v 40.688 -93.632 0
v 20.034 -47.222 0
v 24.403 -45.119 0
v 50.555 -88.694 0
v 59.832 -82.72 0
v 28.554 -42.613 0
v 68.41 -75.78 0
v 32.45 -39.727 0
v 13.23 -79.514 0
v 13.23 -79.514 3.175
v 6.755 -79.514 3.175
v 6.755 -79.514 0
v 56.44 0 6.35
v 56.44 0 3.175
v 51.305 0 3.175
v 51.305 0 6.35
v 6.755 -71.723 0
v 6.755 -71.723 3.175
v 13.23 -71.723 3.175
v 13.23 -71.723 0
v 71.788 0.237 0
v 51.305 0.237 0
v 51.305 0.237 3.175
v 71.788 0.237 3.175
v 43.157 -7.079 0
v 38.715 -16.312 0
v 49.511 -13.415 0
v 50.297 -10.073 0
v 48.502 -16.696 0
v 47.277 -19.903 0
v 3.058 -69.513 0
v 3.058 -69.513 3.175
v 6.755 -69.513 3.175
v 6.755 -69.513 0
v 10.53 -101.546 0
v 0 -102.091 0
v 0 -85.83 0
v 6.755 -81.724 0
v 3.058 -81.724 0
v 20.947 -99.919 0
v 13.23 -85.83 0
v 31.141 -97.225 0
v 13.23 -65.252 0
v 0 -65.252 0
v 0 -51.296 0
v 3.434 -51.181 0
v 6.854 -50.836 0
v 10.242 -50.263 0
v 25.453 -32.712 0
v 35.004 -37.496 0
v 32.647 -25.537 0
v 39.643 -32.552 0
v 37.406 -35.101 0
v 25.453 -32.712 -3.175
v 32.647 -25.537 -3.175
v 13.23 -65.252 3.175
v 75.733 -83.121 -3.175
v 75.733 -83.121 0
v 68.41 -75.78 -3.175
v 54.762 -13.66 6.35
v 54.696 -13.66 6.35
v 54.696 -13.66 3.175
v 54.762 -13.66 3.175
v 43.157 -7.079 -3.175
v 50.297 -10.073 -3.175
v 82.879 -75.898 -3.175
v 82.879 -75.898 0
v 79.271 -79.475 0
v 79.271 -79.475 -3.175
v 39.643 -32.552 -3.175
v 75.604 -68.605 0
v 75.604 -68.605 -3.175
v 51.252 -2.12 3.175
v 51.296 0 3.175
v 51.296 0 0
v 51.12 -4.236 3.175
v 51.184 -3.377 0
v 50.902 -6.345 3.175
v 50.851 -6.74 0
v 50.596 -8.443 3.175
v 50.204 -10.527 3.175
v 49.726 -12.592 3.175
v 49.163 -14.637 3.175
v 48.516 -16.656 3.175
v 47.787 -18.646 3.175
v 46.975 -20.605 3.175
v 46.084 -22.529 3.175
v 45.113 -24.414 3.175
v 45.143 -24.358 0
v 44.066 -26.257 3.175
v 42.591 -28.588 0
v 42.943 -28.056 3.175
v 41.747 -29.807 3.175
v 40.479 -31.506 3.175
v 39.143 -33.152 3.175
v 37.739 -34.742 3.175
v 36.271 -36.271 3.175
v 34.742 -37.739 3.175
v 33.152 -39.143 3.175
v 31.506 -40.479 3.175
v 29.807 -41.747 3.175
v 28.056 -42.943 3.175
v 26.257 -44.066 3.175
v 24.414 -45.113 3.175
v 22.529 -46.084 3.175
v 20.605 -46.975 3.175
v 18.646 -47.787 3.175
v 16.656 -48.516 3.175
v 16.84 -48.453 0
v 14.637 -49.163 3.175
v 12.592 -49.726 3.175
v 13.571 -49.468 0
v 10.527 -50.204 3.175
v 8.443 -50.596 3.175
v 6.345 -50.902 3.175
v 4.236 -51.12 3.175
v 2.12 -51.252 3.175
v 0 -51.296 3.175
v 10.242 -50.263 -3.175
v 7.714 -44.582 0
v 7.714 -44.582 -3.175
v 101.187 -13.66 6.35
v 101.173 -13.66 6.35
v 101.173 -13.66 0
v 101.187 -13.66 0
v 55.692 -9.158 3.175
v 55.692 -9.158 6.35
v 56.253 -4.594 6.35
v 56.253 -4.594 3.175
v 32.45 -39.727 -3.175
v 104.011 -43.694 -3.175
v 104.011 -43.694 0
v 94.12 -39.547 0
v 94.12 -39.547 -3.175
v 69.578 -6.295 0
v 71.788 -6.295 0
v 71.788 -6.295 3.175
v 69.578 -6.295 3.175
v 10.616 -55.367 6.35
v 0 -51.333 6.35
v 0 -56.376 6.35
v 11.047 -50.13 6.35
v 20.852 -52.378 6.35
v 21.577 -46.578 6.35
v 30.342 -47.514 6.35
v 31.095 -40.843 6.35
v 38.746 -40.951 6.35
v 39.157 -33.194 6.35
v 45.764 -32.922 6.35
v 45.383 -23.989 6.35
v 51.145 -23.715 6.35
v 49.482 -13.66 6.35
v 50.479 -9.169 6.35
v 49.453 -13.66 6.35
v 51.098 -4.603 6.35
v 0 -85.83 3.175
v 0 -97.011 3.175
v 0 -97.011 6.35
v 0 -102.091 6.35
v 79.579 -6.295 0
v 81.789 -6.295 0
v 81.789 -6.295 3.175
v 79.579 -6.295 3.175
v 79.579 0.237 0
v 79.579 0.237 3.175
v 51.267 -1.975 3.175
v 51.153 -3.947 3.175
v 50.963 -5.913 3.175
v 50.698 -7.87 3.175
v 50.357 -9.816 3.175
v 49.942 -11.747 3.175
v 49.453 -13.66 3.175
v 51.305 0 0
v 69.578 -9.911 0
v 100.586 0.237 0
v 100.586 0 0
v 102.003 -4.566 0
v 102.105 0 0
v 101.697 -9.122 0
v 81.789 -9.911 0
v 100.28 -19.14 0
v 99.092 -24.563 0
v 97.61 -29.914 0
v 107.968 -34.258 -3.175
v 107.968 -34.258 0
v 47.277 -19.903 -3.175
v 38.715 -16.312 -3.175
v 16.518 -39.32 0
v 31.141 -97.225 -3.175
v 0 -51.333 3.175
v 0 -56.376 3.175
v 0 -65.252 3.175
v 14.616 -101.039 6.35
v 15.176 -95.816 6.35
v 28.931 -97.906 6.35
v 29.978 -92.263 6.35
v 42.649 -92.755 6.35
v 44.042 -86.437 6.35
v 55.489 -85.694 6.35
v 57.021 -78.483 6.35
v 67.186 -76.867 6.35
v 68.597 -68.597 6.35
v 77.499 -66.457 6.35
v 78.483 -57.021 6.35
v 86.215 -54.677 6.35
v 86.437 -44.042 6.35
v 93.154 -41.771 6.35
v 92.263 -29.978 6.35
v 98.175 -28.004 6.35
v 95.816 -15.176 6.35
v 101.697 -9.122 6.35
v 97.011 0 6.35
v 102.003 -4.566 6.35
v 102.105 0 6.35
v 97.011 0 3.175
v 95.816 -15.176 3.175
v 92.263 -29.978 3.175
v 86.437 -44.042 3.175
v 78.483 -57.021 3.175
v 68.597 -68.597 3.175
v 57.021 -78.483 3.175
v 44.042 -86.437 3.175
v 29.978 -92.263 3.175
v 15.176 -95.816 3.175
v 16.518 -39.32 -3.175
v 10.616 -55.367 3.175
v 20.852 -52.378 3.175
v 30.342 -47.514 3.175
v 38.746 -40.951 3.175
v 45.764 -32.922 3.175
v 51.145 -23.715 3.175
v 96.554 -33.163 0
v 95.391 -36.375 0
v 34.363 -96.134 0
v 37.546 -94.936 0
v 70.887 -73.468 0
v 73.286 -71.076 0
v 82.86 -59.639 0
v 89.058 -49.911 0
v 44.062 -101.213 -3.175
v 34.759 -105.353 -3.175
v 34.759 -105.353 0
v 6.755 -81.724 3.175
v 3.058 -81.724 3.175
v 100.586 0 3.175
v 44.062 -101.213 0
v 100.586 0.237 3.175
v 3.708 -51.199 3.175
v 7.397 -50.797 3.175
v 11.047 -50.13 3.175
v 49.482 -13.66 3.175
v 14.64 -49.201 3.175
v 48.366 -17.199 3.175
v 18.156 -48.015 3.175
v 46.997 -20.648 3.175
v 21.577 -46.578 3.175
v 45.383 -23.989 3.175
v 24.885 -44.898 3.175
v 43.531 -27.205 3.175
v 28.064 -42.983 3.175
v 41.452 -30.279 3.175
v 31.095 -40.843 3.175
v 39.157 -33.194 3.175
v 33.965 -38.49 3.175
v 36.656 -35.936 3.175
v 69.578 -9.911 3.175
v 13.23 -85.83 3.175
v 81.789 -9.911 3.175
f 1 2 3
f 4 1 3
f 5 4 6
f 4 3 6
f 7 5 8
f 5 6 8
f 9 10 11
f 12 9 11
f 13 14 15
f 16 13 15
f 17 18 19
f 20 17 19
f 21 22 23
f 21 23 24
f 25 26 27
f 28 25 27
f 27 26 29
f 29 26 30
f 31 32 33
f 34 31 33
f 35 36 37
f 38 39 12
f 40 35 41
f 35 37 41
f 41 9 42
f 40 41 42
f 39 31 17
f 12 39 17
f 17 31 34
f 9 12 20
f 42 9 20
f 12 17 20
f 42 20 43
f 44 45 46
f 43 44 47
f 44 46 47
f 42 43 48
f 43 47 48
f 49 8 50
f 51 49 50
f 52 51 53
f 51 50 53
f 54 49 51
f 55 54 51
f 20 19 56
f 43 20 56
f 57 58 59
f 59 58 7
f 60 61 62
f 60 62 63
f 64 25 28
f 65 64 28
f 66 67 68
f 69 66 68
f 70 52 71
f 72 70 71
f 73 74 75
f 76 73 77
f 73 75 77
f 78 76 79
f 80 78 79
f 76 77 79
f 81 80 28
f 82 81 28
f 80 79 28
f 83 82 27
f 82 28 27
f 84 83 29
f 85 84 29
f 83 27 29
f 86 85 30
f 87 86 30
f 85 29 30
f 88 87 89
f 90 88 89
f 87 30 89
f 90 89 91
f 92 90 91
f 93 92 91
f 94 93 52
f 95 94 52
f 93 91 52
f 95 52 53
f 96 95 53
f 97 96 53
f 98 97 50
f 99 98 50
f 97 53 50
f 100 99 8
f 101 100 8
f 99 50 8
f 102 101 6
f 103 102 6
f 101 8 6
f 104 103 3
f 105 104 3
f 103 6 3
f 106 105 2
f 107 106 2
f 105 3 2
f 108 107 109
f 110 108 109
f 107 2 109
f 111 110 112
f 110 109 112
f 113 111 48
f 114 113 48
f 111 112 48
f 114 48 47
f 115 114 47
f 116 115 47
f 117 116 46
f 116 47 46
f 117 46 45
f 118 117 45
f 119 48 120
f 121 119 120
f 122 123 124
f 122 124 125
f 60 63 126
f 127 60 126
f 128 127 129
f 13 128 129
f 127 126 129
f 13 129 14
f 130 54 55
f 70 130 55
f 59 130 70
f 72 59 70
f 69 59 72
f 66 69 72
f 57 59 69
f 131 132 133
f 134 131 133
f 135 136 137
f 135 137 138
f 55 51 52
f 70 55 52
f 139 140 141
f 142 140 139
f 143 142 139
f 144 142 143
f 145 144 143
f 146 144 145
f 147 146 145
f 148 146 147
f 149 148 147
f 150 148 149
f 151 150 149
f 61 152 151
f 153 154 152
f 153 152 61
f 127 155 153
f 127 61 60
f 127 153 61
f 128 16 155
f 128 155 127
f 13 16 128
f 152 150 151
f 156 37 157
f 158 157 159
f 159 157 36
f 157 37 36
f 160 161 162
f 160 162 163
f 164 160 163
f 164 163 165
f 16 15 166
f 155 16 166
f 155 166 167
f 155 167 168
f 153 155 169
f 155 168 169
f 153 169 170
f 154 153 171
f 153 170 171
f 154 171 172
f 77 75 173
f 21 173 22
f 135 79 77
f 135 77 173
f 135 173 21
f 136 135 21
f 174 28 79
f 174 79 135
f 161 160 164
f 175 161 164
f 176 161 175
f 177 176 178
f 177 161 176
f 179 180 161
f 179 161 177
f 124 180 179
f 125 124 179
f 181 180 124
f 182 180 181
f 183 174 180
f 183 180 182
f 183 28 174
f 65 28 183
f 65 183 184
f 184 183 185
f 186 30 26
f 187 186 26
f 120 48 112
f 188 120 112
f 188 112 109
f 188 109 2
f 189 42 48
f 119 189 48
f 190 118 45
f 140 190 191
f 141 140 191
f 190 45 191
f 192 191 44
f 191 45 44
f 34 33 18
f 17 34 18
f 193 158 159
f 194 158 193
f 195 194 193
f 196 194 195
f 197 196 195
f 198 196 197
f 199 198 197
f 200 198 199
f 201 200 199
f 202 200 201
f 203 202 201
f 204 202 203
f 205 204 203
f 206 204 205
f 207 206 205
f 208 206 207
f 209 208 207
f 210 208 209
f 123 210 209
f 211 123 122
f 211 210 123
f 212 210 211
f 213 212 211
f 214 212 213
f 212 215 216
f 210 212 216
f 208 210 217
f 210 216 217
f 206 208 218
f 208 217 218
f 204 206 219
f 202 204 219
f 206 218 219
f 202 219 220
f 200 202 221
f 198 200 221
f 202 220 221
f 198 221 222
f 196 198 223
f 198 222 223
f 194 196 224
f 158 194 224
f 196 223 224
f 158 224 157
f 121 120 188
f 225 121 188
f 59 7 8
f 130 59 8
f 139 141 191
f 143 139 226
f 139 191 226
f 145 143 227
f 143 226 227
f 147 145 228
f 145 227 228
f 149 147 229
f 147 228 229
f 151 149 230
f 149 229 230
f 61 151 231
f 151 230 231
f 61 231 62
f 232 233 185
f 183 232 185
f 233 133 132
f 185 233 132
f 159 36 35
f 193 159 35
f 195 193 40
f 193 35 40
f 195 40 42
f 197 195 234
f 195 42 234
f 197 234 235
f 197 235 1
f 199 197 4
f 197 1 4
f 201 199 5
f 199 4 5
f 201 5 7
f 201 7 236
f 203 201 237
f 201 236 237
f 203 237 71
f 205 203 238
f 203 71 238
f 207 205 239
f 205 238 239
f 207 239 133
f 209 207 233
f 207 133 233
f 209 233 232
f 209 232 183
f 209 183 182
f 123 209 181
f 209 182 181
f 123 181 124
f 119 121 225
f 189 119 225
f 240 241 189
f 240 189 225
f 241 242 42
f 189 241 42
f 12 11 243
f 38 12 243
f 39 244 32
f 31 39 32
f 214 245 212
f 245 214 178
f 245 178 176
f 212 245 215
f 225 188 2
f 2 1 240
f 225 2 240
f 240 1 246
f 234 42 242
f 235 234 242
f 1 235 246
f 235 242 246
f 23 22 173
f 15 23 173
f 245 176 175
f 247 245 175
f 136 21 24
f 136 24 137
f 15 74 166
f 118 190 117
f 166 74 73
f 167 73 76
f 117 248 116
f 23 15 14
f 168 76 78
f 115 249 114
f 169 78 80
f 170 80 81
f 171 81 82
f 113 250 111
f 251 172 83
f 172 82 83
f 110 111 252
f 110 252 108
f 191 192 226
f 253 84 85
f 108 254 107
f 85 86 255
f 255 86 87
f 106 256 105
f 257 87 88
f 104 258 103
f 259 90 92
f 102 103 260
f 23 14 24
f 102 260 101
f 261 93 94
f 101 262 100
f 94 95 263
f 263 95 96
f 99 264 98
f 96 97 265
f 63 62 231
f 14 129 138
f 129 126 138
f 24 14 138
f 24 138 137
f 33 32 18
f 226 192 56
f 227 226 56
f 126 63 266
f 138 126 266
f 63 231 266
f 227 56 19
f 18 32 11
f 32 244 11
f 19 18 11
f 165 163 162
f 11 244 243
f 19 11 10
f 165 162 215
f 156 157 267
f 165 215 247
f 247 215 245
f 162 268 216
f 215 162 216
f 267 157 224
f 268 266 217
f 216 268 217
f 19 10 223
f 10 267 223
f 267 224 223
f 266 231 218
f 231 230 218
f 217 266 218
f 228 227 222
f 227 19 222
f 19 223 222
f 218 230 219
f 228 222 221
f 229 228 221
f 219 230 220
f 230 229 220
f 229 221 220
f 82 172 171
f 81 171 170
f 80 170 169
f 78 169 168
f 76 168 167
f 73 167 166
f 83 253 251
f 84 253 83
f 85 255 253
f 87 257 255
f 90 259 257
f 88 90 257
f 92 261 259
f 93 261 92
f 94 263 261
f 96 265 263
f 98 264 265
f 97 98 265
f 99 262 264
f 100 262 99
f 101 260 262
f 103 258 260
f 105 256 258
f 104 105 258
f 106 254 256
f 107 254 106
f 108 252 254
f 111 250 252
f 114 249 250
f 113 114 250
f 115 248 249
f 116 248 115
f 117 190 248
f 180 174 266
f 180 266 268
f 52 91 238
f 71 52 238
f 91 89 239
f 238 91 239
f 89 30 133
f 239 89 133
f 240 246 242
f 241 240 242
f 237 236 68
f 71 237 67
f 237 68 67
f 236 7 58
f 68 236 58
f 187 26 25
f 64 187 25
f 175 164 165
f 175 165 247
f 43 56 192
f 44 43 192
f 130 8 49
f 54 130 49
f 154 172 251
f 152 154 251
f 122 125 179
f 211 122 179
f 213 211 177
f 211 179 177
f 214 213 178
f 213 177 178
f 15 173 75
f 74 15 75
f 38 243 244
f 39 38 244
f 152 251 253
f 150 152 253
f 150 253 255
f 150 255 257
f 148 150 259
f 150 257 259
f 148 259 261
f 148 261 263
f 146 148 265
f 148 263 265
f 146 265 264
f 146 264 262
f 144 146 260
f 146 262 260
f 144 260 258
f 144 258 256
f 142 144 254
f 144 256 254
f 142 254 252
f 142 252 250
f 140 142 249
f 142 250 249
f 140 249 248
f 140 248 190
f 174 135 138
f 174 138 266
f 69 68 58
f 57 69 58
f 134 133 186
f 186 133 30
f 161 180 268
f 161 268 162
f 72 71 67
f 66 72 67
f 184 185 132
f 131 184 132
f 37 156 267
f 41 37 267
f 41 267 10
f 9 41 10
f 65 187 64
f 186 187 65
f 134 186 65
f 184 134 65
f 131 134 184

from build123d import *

# Parameters (mm, degrees)
F1_DEPTH  = 3.175
F4_DEPTH  = 3.175
F6_DEPTH  = 6.35
F7_DEPTH  = 3.175
F9_DEPTH  = 25.4
F11_DEPTH = 3.175
F13_DEPTH = 3.175
F14_DEPTH = 25.4


with BuildPart() as f1:
    # F0 (on Top) → F1 (new body)
    with BuildSketch(Plane.XY):
        with BuildLine():
            Line((0, -51.2956328023), (0, -102.09075941))
            ThreePointArc((0, -102.09075941), (72.1890682753, -72.1890682753), (102.09075941, 0))
            Line((102.09075941, 0), (51.2956328023, 0))
            ThreePointArc((51.2956328023, 0), (36.2714897998, -36.2714897998), (0, -51.2956328023))
        make_face()
    extrude(amount=F1_DEPTH)

    # F3 (on face) → F4 (join)
    with BuildSketch(Plane.XY.offset(3.175)):
        with BuildLine():
            ThreePointArc((0, -56.3756328023), (39.8635922482, -39.8635922482), (56.3756328023, 0))
            Line((56.3756328023, 0), (51.3330261441, 0))
            ThreePointArc((51.3330261441, 0), (36.2979308853, -36.2979308853), (0, -51.3330261441))
            Line((0, -51.3330261441), (0, -56.3756328023))
        make_face()
        with BuildLine():
            Line((102.09075941, 0), (97.01075941, 0))
            ThreePointArc((97.01075941, 0), (68.5969658269, -68.5969658269), (0, -97.01075941))
            Line((0, -97.01075941), (0, -102.09075941))
            ThreePointArc((0, -102.09075941), (72.1890682753, -72.1890682753), (102.09075941, 0))
        make_face()
    extrude(amount=F4_DEPTH)

    # F5 (on Top) → F6 (join)
    with BuildSketch(Plane.XY):
        with BuildLine():
            ThreePointArc((54.7619331998, -13.660392724), (56.0189261095, -6.8815386855), (56.4400182242, 0))
            Line((56.4400182242, 0), (51.3051767249, 0))
            ThreePointArc((51.3051767249, 0), (50.8400637591, -6.8926827684), (49.4531579316, -13.660392724))
            Line((49.4531579316, -13.660392724), (54.7619331998, -13.660392724))
        make_face()
        with BuildLine():
            Line((102.1051767249, 0), (97.1390098326, 0))
            ThreePointArc((97.1390098326, 0), (96.8973822865, -6.8472284381), (96.1737017167, -13.660392724))
            Line((96.1737017167, -13.660392724), (101.1872560388, -13.660392724))
            ThreePointArc((101.1872560388, -13.660392724), (101.8754380952, -6.8455990928), (102.1051767249, 0))
        make_face()
    extrude(amount=F6_DEPTH)

    # F2 (on Top) → F7 (join)
    with BuildSketch(Plane.XY):
        Polygon((65.3862244444, -13.4132344524), (65.3862244444, 0.2373858813), (51.3049019501, 0.2373858813), (51.3049019501, -13.4632168472), align=None)
        Polygon((100.5855267867, 0.2373858813), (85.8938746733, 0.2373858813), (85.9641355587, -13.4132344524), (100.5855267867, -13.4132344524), align=None)
    extrude(amount=F7_DEPTH)

    # F8 (on face) → F9 (cut)
    with BuildSketch(Plane.XY.offset(3.175)):
        Polygon((0, -85.8303158734), (13.2304336887, -85.8303158734), (13.2304336887, -79.5142199461), (6.7552071823, -79.5142199461), (6.7552071823, -81.7240199461), (3.0578118576, -81.7240199461), (3.0578118576, -69.5130521654), (6.7552071823, -69.5130521654), (6.7552071823, -71.7228521654), (13.2304336887, -71.7228521654), (13.2304336887, -65.2524047592), (0, -65.2524047592), align=None)
    extrude(amount=-F9_DEPTH, mode=Mode.SUBTRACT)

    # F10 (on face) → F11 (join)
    with BuildSketch(Plane(origin=(0, 0, 0), x_dir=(1, 0, 0), z_dir=(0, 0, -1))):
        with BuildLine():
            ThreePointArc((39.6434592285, 32.5520826521), (37.980845771, 34.4774897449), (36.2248193412, 36.3181002847))
            Line((36.2248193412, 36.3181002847), (29.0498583475, 29.1246633635))
            Line((29.0498583475, 29.1246633635), (32.646576808, 25.5371828667))
            Line((32.646576808, 25.5371828667), (39.6434592285, 32.5520826521))
        make_face()
        with BuildLine():
            Line((29.0498583475, 29.1246633635), (36.2248193412, 36.3181002847))
            ThreePointArc((36.2248193412, 36.3181002847), (34.3796988436, 38.0693873344), (32.4500223073, 39.7270436459))
            Line((32.4500223073, 39.7270436459), (25.4531398869, 32.7121438604))
            Line((25.4531398869, 32.7121438604), (29.0498583475, 29.1246633635))
        make_face()
        with BuildLine():
            Line((36.2248193412, 36.3181002847), (72.0961827352, 72.2818344532))
            ThreePointArc((72.0961827352, 72.2818344532), (70.2749350461, 74.0537417095), (68.4101530773, 75.7797737714))
            Line((68.4101530773, 75.7797737714), (32.4500223073, 39.7270436459))
            ThreePointArc((32.4500223073, 39.7270436459), (34.3796988436, 38.0693873344), (36.2248193412, 36.3181002847))
        make_face()
        with BuildLine():
            ThreePointArc((75.6035899985, 68.6048127777), (73.8727679087, 70.4651496728), (72.0961827352, 72.2818344532))
            Line((72.0961827352, 72.2818344532), (36.2248193412, 36.3181002847))
            ThreePointArc((36.2248193412, 36.3181002847), (37.980845771, 34.4774897449), (39.6434592285, 32.5520826521))
            Line((39.6434592285, 32.5520826521), (75.6035899985, 68.6048127777))
        make_face()
        with BuildLine():
            Line((79.271143729, 79.4752713743), (72.0961827352, 72.2818344532))
            ThreePointArc((72.0961827352, 72.2818344532), (73.8727679087, 70.4651496728), (75.6035899985, 68.6048127777))
            Line((75.6035899985, 68.6048127777), (82.8785053866, 75.8984614814))
            Line((82.8785053866, 75.8984614814), (79.271143729, 79.4752713743))
        make_face()
        with BuildLine():
            ThreePointArc((68.4101530773, 75.7797737714), (70.2749350461, 74.0537417095), (72.0961827352, 72.2818344532))
            Line((72.0961827352, 72.2818344532), (79.271143729, 79.4752713743))
            Line((79.271143729, 79.4752713743), (75.7328631666, 83.1213402502))
            Line((75.7328631666, 83.1213402502), (68.4101530773, 75.7797737714))
        make_face()
        with BuildLine():
            Line((20.0341812257, 47.2215366883), (40.6881574418, 93.6322433828))
            ThreePointArc((40.6881574418, 93.6322433828), (35.9596571955, 95.5480309127), (31.1413521737, 97.2251991086))
            Line((31.1413521737, 97.2251991086), (10.2418471319, 50.2627746142))
            ThreePointArc((10.2418471319, 50.2627746142), (15.2141958482, 48.9874493037), (20.0341812257, 47.2215366883))
        make_face()
        with BuildLine():
            ThreePointArc((31.1413521737, 97.2251991086), (35.9596571955, 95.5480309127), (40.6881574418, 93.6322433828))
            Line((40.6881574418, 93.6322433828), (44.0618023276, 101.2130230665))
            Line((44.0618023276, 101.2130230665), (34.7585338749, 105.353220427))
            Line((34.7585338749, 105.353220427), (31.1413521737, 97.2251991086))
        make_face()
        with BuildLine():
            Line((16.5176168084, 39.3196083605), (20.0341812257, 47.2215366883))
            ThreePointArc((20.0341812257, 47.2215366883), (15.2141958482, 48.9874493037), (10.2418471319, 50.2627746142))
            Line((10.2418471319, 50.2627746142), (7.7137911807, 44.5820833017))
            Line((7.7137911807, 44.5820833017), (16.5176168084, 39.3196083605))
        make_face()
        with BuildLine():
            ThreePointArc((50.2968928634, 10.0729594896), (49.0339423103, 15.0636796999), (47.2771132537, 19.902675875))
            Line((47.2771132537, 19.902675875), (38.7149937451, 16.3121093065))
            Line((38.7149937451, 16.3121093065), (43.1567628434, 7.0787111473))
            Line((43.1567628434, 7.0787111473), (50.2968928634, 10.0729594896))
        make_face()
        with BuildLine():
            ThreePointArc((97.6098508897, 29.9138791566), (95.9858944102, 34.7740022313), (94.1201154327, 39.5465172658))
            Line((94.1201154327, 39.5465172658), (47.2771132537, 19.902675875))
            ThreePointArc((47.2771132537, 19.902675875), (49.0339423103, 15.0636796999), (50.2968928634, 10.0729594896))
            Line((50.2968928634, 10.0729594896), (97.6098508897, 29.9138791566))
        make_face()
        with BuildLine():
            Line((104.0109246969, 43.6942763627), (94.1201154327, 39.5465172658))
            ThreePointArc((94.1201154327, 39.5465172658), (95.9858944102, 34.7740022313), (97.6098508897, 29.9138791566))
            Line((97.6098508897, 29.9138791566), (107.9681979582, 34.2577025116))
            Line((107.9681979582, 34.2577025116), (104.0109246969, 43.6942763627))
        make_face()
    extrude(amount=F11_DEPTH)

    # F12 (on face) → F13 (join)
    with BuildSketch(Plane(origin=(0, 0, 0), x_dir=(1, 0, 0), z_dir=(0, 0, -1))):
        Polygon((65.3862244444, 0), (65.3862244444, -0.2373858813), (85.8938746733, -0.2373858813), (85.8950965183, 0), align=None)
    extrude(amount=-F13_DEPTH)

    # F2 (on Top) → F14 (cut)
    with BuildSketch(Plane.XY):
        Polygon((81.7886919434, -6.2948371671), (79.5788919434, -6.2948371671), (79.5788919434, 0.2373858813), (71.7875241627, 0.2373858813), (71.7875241627, -6.2948371671), (69.5777241627, -6.2948371671), (69.5777241627, -9.9109848417), (81.7886919434, -9.9109848417), align=None)
    extrude(amount=F14_DEPTH, mode=Mode.SUBTRACT)


solid = f1.part
